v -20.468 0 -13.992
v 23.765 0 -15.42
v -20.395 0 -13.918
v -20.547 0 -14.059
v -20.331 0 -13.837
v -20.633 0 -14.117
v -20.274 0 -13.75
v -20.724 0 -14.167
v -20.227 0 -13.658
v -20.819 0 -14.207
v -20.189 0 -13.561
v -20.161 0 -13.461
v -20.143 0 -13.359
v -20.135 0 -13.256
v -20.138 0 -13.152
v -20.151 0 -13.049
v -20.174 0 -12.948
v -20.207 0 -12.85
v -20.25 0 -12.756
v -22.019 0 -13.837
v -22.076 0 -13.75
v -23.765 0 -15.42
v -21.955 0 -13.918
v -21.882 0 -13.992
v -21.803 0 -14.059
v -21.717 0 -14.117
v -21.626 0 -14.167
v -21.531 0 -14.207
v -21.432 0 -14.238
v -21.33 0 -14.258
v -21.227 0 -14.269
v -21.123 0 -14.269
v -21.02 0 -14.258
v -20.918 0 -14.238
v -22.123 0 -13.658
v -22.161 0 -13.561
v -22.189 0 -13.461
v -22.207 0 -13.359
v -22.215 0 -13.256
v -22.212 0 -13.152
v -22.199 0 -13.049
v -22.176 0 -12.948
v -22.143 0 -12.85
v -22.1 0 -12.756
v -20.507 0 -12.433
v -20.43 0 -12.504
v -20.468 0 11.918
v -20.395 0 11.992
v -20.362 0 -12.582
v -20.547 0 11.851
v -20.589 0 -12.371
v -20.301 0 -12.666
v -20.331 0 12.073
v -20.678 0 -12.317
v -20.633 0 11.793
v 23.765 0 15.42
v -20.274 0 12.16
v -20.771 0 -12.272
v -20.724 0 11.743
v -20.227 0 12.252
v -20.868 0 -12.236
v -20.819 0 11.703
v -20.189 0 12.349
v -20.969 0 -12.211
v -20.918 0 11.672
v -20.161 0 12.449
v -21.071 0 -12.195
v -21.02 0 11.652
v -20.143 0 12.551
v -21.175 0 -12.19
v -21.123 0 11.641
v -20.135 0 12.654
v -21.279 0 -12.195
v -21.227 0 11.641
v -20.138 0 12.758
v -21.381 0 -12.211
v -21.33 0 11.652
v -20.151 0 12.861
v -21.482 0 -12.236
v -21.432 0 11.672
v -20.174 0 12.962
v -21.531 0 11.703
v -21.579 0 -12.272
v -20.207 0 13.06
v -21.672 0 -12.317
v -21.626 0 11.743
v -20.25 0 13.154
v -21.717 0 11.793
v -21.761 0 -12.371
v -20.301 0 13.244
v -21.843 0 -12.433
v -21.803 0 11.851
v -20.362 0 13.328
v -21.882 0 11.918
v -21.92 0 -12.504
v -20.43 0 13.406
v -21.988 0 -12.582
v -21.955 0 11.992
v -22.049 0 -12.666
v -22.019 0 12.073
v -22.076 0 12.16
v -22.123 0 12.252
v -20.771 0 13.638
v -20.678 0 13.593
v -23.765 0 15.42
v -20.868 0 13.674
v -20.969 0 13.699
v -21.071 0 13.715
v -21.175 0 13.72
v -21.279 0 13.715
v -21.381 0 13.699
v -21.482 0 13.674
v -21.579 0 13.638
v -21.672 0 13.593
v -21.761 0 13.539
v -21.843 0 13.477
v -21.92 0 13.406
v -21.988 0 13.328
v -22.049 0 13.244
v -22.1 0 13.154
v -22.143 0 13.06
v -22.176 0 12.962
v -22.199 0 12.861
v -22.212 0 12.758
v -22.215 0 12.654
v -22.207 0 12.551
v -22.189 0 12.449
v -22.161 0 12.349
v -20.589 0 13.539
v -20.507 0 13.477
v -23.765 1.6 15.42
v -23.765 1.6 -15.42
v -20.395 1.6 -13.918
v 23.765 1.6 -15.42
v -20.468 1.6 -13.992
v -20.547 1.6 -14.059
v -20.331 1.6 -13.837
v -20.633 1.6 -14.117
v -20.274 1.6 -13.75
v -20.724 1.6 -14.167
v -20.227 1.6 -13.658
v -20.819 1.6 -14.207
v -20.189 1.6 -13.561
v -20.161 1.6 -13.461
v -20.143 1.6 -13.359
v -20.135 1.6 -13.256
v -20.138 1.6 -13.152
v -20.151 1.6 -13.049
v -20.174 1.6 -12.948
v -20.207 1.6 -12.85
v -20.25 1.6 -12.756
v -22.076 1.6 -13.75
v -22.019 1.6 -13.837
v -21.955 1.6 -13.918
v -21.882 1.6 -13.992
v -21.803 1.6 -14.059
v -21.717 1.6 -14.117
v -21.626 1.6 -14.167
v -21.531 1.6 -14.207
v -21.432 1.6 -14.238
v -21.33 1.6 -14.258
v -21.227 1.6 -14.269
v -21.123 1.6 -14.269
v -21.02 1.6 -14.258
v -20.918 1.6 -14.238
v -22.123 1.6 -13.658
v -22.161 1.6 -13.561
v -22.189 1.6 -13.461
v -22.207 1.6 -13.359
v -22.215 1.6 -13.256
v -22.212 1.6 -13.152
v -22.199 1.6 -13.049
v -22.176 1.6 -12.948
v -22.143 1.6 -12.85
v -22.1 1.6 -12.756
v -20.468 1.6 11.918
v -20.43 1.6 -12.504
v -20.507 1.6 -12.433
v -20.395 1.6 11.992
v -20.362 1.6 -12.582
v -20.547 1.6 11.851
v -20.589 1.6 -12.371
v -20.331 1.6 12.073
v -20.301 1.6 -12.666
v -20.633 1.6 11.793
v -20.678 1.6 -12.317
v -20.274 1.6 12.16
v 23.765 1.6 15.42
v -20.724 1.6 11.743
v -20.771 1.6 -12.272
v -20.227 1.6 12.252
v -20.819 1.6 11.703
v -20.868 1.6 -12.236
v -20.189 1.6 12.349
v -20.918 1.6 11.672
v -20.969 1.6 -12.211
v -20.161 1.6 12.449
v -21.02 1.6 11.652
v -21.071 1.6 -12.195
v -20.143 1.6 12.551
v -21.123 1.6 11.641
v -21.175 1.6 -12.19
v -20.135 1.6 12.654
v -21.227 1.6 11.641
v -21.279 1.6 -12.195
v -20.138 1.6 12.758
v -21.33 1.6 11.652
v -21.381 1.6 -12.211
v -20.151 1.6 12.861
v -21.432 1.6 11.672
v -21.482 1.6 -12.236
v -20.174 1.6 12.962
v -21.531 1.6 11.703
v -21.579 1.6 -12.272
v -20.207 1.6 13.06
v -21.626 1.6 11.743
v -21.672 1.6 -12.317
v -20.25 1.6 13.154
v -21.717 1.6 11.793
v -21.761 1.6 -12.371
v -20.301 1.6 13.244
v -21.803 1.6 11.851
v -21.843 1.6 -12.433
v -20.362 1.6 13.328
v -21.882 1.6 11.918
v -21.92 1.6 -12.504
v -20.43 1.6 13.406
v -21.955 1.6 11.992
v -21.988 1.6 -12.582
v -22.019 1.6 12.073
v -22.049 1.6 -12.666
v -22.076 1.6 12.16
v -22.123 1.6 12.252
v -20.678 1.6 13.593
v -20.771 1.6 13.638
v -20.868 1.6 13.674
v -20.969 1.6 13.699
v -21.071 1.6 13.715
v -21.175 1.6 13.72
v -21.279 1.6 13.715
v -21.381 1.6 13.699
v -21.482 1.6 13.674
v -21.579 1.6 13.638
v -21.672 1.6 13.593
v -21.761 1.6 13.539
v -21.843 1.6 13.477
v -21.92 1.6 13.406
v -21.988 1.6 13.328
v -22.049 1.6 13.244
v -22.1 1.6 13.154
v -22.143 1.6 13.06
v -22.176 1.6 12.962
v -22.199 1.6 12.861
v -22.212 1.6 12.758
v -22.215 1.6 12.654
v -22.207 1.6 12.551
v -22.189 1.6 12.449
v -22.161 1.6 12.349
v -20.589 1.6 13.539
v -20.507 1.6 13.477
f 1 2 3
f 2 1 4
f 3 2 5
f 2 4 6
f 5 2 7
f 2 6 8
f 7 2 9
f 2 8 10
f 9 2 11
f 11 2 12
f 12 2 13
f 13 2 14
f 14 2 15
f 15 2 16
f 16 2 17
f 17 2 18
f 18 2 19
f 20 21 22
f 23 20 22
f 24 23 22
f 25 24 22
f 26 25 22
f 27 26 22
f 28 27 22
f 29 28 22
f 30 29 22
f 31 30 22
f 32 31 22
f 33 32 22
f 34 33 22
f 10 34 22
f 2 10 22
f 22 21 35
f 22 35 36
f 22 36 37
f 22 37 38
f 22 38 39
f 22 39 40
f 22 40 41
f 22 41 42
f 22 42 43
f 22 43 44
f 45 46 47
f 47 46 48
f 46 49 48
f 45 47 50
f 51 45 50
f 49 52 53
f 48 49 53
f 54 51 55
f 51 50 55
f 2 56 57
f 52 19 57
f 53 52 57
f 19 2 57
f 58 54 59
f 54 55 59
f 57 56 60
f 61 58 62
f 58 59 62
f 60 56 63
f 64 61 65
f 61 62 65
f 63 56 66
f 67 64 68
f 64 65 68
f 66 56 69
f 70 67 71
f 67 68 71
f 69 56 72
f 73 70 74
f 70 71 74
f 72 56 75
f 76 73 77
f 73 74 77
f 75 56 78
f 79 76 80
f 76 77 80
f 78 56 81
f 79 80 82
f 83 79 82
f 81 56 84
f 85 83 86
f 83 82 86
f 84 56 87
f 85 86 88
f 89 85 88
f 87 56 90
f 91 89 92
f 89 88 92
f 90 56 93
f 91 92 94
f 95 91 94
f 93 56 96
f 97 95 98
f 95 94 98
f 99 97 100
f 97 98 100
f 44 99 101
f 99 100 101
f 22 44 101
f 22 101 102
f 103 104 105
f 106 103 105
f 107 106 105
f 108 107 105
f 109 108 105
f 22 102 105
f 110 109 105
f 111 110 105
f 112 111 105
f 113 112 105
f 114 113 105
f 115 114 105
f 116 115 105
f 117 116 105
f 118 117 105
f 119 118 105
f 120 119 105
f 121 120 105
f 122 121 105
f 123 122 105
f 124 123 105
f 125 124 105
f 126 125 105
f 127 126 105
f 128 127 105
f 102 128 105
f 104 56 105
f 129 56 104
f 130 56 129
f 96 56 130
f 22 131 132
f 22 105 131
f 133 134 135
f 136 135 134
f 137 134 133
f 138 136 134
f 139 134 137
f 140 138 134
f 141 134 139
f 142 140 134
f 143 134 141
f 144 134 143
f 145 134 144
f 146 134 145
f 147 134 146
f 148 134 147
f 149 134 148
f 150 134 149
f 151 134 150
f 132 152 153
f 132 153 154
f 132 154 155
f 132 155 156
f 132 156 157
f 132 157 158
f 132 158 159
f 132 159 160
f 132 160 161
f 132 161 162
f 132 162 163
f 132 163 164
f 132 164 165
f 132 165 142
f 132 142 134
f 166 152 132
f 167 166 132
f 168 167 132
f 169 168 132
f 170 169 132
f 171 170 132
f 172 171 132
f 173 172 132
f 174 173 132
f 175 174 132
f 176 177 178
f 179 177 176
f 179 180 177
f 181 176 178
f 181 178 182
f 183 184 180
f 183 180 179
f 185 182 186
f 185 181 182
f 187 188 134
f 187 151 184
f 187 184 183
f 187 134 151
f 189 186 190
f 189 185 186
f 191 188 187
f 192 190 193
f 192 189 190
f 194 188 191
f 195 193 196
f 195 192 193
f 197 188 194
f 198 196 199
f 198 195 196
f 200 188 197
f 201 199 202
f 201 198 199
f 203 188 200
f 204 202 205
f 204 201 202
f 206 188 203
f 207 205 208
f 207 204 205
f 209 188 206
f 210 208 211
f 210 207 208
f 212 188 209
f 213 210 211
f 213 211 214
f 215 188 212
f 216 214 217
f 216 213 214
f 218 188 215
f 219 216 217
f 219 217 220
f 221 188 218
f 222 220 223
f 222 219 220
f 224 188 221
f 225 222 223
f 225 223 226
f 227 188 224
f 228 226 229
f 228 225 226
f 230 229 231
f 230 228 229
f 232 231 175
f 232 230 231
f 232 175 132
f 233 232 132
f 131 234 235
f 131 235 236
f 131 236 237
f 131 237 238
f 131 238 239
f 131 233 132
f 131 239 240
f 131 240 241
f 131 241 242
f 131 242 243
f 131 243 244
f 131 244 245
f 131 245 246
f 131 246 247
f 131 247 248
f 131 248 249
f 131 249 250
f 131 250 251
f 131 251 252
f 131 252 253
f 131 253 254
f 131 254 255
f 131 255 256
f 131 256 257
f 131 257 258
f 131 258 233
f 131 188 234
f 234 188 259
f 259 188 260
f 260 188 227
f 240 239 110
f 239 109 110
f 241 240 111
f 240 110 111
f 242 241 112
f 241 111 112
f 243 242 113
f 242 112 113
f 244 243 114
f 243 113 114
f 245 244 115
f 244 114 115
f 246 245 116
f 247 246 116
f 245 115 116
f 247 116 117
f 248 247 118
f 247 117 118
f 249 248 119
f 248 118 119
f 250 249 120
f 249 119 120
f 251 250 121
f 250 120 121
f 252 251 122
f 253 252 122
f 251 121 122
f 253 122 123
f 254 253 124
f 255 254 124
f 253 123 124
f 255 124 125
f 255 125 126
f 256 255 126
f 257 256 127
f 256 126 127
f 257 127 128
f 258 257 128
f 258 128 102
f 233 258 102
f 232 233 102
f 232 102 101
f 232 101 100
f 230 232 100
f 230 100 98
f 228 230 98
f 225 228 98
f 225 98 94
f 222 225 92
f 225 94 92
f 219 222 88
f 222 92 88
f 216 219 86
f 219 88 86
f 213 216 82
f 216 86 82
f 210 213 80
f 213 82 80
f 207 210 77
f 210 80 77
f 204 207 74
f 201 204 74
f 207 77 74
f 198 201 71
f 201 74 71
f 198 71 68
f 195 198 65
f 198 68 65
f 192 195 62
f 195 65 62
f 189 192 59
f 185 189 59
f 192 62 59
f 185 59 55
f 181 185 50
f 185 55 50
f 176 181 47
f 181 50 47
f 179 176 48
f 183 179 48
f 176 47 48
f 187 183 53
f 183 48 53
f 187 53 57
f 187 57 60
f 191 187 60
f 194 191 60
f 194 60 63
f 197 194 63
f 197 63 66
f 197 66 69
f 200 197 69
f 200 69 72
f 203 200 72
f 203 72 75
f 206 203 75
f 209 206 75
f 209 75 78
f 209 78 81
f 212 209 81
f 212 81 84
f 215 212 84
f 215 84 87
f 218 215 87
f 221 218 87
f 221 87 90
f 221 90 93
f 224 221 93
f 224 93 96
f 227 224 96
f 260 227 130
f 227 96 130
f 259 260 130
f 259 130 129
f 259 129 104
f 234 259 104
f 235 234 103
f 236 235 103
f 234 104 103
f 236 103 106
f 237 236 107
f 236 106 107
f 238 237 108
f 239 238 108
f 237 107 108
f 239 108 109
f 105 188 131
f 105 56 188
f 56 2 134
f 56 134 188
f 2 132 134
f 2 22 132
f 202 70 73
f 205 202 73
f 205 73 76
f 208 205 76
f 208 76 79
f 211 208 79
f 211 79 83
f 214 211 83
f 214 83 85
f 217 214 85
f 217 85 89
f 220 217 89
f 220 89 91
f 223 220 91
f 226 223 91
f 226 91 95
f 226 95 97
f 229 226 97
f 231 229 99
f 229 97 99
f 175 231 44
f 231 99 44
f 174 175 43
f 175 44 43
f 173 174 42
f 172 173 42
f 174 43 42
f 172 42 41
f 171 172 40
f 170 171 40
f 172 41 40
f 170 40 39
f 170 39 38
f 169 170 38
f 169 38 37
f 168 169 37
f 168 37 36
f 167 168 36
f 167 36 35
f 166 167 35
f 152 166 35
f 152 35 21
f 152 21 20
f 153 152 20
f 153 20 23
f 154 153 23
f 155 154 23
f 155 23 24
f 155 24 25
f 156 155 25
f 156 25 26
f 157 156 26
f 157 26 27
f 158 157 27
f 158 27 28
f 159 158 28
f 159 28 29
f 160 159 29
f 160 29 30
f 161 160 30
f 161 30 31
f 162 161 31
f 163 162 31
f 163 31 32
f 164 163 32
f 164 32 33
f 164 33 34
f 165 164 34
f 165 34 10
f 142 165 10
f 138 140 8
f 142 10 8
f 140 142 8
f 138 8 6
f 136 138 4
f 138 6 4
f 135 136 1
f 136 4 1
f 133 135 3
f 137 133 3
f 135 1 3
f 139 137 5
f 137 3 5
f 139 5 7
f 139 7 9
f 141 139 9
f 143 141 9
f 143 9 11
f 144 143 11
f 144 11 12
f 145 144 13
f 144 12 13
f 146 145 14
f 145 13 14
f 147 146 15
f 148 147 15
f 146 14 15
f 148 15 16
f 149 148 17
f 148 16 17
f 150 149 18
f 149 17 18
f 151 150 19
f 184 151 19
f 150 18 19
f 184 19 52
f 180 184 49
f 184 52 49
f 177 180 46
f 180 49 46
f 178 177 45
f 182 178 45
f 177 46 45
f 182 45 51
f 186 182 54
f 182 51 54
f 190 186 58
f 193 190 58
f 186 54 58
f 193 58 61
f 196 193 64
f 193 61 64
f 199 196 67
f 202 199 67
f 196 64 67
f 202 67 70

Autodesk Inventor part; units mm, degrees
ref_plane "YZ Plane" through (0, 0, 0) normal (1, 0, 0) x (0, 1, 0)
ref_plane "XZ Plane" through (0, 0, 0) normal (0, 1, 0) x (-1, 0, 0)
ref_plane "XY Plane" through (0, 0, 0) normal (0, 0, 1) x (1, 0, 0)
sketch "Sketch1" plane through (0, 0, 0) normal (0, 1, 0) x (-1, 0, 0)
  line L0 (-23.765, 15.42) -> (23.765, 15.42)
  line L1 (23.765, 15.42) -> (23.765, -15.42)
  line L2 (23.765, -15.42) -> (-23.765, -15.42)
  line L3 (-23.765, -15.42) -> (-23.765, 15.42)
  line L4 (-23.765, 15.42) -> (23.765, -15.42) construction
  line L5 (23.765, 15.42) -> (-23.765, -15.42) construction
  point P0 (0, 0)
  dimension "d0" = 47.53
  dimension "d1" = 30.84
extrude "Extrusion1" add sketch "Sketch1" along normal blind 1.6
sketch "Sketch2" plane through (0, 1.6, 0) normal (0, 1, 0) x (1, 0, 0)
  line L0 (23.765, 15.42) -> (-23.765, 15.42) projected
  line L1 (-23.765, -15.42) -> (23.765, -15.42) projected
  line L2 (-23.765, 15.42) -> (-23.765, -15.42) projected
  point P0 (0, 0)
  point P1 (-21.175, -12.68)
  point P2 (-21.175, 13.23)
  dimension "d4" = 25.91
  dimension "d5" = 2.19
  dimension "d6" = 2.74
  dimension "d7" = 2.59
hole "Hole1" at (-21.175, 1.6, 12.68) at (-21.175, 1.6, -13.23) direction (0, -1, 0) diameter 2.08 end through all
properties part number "SD card holder"
